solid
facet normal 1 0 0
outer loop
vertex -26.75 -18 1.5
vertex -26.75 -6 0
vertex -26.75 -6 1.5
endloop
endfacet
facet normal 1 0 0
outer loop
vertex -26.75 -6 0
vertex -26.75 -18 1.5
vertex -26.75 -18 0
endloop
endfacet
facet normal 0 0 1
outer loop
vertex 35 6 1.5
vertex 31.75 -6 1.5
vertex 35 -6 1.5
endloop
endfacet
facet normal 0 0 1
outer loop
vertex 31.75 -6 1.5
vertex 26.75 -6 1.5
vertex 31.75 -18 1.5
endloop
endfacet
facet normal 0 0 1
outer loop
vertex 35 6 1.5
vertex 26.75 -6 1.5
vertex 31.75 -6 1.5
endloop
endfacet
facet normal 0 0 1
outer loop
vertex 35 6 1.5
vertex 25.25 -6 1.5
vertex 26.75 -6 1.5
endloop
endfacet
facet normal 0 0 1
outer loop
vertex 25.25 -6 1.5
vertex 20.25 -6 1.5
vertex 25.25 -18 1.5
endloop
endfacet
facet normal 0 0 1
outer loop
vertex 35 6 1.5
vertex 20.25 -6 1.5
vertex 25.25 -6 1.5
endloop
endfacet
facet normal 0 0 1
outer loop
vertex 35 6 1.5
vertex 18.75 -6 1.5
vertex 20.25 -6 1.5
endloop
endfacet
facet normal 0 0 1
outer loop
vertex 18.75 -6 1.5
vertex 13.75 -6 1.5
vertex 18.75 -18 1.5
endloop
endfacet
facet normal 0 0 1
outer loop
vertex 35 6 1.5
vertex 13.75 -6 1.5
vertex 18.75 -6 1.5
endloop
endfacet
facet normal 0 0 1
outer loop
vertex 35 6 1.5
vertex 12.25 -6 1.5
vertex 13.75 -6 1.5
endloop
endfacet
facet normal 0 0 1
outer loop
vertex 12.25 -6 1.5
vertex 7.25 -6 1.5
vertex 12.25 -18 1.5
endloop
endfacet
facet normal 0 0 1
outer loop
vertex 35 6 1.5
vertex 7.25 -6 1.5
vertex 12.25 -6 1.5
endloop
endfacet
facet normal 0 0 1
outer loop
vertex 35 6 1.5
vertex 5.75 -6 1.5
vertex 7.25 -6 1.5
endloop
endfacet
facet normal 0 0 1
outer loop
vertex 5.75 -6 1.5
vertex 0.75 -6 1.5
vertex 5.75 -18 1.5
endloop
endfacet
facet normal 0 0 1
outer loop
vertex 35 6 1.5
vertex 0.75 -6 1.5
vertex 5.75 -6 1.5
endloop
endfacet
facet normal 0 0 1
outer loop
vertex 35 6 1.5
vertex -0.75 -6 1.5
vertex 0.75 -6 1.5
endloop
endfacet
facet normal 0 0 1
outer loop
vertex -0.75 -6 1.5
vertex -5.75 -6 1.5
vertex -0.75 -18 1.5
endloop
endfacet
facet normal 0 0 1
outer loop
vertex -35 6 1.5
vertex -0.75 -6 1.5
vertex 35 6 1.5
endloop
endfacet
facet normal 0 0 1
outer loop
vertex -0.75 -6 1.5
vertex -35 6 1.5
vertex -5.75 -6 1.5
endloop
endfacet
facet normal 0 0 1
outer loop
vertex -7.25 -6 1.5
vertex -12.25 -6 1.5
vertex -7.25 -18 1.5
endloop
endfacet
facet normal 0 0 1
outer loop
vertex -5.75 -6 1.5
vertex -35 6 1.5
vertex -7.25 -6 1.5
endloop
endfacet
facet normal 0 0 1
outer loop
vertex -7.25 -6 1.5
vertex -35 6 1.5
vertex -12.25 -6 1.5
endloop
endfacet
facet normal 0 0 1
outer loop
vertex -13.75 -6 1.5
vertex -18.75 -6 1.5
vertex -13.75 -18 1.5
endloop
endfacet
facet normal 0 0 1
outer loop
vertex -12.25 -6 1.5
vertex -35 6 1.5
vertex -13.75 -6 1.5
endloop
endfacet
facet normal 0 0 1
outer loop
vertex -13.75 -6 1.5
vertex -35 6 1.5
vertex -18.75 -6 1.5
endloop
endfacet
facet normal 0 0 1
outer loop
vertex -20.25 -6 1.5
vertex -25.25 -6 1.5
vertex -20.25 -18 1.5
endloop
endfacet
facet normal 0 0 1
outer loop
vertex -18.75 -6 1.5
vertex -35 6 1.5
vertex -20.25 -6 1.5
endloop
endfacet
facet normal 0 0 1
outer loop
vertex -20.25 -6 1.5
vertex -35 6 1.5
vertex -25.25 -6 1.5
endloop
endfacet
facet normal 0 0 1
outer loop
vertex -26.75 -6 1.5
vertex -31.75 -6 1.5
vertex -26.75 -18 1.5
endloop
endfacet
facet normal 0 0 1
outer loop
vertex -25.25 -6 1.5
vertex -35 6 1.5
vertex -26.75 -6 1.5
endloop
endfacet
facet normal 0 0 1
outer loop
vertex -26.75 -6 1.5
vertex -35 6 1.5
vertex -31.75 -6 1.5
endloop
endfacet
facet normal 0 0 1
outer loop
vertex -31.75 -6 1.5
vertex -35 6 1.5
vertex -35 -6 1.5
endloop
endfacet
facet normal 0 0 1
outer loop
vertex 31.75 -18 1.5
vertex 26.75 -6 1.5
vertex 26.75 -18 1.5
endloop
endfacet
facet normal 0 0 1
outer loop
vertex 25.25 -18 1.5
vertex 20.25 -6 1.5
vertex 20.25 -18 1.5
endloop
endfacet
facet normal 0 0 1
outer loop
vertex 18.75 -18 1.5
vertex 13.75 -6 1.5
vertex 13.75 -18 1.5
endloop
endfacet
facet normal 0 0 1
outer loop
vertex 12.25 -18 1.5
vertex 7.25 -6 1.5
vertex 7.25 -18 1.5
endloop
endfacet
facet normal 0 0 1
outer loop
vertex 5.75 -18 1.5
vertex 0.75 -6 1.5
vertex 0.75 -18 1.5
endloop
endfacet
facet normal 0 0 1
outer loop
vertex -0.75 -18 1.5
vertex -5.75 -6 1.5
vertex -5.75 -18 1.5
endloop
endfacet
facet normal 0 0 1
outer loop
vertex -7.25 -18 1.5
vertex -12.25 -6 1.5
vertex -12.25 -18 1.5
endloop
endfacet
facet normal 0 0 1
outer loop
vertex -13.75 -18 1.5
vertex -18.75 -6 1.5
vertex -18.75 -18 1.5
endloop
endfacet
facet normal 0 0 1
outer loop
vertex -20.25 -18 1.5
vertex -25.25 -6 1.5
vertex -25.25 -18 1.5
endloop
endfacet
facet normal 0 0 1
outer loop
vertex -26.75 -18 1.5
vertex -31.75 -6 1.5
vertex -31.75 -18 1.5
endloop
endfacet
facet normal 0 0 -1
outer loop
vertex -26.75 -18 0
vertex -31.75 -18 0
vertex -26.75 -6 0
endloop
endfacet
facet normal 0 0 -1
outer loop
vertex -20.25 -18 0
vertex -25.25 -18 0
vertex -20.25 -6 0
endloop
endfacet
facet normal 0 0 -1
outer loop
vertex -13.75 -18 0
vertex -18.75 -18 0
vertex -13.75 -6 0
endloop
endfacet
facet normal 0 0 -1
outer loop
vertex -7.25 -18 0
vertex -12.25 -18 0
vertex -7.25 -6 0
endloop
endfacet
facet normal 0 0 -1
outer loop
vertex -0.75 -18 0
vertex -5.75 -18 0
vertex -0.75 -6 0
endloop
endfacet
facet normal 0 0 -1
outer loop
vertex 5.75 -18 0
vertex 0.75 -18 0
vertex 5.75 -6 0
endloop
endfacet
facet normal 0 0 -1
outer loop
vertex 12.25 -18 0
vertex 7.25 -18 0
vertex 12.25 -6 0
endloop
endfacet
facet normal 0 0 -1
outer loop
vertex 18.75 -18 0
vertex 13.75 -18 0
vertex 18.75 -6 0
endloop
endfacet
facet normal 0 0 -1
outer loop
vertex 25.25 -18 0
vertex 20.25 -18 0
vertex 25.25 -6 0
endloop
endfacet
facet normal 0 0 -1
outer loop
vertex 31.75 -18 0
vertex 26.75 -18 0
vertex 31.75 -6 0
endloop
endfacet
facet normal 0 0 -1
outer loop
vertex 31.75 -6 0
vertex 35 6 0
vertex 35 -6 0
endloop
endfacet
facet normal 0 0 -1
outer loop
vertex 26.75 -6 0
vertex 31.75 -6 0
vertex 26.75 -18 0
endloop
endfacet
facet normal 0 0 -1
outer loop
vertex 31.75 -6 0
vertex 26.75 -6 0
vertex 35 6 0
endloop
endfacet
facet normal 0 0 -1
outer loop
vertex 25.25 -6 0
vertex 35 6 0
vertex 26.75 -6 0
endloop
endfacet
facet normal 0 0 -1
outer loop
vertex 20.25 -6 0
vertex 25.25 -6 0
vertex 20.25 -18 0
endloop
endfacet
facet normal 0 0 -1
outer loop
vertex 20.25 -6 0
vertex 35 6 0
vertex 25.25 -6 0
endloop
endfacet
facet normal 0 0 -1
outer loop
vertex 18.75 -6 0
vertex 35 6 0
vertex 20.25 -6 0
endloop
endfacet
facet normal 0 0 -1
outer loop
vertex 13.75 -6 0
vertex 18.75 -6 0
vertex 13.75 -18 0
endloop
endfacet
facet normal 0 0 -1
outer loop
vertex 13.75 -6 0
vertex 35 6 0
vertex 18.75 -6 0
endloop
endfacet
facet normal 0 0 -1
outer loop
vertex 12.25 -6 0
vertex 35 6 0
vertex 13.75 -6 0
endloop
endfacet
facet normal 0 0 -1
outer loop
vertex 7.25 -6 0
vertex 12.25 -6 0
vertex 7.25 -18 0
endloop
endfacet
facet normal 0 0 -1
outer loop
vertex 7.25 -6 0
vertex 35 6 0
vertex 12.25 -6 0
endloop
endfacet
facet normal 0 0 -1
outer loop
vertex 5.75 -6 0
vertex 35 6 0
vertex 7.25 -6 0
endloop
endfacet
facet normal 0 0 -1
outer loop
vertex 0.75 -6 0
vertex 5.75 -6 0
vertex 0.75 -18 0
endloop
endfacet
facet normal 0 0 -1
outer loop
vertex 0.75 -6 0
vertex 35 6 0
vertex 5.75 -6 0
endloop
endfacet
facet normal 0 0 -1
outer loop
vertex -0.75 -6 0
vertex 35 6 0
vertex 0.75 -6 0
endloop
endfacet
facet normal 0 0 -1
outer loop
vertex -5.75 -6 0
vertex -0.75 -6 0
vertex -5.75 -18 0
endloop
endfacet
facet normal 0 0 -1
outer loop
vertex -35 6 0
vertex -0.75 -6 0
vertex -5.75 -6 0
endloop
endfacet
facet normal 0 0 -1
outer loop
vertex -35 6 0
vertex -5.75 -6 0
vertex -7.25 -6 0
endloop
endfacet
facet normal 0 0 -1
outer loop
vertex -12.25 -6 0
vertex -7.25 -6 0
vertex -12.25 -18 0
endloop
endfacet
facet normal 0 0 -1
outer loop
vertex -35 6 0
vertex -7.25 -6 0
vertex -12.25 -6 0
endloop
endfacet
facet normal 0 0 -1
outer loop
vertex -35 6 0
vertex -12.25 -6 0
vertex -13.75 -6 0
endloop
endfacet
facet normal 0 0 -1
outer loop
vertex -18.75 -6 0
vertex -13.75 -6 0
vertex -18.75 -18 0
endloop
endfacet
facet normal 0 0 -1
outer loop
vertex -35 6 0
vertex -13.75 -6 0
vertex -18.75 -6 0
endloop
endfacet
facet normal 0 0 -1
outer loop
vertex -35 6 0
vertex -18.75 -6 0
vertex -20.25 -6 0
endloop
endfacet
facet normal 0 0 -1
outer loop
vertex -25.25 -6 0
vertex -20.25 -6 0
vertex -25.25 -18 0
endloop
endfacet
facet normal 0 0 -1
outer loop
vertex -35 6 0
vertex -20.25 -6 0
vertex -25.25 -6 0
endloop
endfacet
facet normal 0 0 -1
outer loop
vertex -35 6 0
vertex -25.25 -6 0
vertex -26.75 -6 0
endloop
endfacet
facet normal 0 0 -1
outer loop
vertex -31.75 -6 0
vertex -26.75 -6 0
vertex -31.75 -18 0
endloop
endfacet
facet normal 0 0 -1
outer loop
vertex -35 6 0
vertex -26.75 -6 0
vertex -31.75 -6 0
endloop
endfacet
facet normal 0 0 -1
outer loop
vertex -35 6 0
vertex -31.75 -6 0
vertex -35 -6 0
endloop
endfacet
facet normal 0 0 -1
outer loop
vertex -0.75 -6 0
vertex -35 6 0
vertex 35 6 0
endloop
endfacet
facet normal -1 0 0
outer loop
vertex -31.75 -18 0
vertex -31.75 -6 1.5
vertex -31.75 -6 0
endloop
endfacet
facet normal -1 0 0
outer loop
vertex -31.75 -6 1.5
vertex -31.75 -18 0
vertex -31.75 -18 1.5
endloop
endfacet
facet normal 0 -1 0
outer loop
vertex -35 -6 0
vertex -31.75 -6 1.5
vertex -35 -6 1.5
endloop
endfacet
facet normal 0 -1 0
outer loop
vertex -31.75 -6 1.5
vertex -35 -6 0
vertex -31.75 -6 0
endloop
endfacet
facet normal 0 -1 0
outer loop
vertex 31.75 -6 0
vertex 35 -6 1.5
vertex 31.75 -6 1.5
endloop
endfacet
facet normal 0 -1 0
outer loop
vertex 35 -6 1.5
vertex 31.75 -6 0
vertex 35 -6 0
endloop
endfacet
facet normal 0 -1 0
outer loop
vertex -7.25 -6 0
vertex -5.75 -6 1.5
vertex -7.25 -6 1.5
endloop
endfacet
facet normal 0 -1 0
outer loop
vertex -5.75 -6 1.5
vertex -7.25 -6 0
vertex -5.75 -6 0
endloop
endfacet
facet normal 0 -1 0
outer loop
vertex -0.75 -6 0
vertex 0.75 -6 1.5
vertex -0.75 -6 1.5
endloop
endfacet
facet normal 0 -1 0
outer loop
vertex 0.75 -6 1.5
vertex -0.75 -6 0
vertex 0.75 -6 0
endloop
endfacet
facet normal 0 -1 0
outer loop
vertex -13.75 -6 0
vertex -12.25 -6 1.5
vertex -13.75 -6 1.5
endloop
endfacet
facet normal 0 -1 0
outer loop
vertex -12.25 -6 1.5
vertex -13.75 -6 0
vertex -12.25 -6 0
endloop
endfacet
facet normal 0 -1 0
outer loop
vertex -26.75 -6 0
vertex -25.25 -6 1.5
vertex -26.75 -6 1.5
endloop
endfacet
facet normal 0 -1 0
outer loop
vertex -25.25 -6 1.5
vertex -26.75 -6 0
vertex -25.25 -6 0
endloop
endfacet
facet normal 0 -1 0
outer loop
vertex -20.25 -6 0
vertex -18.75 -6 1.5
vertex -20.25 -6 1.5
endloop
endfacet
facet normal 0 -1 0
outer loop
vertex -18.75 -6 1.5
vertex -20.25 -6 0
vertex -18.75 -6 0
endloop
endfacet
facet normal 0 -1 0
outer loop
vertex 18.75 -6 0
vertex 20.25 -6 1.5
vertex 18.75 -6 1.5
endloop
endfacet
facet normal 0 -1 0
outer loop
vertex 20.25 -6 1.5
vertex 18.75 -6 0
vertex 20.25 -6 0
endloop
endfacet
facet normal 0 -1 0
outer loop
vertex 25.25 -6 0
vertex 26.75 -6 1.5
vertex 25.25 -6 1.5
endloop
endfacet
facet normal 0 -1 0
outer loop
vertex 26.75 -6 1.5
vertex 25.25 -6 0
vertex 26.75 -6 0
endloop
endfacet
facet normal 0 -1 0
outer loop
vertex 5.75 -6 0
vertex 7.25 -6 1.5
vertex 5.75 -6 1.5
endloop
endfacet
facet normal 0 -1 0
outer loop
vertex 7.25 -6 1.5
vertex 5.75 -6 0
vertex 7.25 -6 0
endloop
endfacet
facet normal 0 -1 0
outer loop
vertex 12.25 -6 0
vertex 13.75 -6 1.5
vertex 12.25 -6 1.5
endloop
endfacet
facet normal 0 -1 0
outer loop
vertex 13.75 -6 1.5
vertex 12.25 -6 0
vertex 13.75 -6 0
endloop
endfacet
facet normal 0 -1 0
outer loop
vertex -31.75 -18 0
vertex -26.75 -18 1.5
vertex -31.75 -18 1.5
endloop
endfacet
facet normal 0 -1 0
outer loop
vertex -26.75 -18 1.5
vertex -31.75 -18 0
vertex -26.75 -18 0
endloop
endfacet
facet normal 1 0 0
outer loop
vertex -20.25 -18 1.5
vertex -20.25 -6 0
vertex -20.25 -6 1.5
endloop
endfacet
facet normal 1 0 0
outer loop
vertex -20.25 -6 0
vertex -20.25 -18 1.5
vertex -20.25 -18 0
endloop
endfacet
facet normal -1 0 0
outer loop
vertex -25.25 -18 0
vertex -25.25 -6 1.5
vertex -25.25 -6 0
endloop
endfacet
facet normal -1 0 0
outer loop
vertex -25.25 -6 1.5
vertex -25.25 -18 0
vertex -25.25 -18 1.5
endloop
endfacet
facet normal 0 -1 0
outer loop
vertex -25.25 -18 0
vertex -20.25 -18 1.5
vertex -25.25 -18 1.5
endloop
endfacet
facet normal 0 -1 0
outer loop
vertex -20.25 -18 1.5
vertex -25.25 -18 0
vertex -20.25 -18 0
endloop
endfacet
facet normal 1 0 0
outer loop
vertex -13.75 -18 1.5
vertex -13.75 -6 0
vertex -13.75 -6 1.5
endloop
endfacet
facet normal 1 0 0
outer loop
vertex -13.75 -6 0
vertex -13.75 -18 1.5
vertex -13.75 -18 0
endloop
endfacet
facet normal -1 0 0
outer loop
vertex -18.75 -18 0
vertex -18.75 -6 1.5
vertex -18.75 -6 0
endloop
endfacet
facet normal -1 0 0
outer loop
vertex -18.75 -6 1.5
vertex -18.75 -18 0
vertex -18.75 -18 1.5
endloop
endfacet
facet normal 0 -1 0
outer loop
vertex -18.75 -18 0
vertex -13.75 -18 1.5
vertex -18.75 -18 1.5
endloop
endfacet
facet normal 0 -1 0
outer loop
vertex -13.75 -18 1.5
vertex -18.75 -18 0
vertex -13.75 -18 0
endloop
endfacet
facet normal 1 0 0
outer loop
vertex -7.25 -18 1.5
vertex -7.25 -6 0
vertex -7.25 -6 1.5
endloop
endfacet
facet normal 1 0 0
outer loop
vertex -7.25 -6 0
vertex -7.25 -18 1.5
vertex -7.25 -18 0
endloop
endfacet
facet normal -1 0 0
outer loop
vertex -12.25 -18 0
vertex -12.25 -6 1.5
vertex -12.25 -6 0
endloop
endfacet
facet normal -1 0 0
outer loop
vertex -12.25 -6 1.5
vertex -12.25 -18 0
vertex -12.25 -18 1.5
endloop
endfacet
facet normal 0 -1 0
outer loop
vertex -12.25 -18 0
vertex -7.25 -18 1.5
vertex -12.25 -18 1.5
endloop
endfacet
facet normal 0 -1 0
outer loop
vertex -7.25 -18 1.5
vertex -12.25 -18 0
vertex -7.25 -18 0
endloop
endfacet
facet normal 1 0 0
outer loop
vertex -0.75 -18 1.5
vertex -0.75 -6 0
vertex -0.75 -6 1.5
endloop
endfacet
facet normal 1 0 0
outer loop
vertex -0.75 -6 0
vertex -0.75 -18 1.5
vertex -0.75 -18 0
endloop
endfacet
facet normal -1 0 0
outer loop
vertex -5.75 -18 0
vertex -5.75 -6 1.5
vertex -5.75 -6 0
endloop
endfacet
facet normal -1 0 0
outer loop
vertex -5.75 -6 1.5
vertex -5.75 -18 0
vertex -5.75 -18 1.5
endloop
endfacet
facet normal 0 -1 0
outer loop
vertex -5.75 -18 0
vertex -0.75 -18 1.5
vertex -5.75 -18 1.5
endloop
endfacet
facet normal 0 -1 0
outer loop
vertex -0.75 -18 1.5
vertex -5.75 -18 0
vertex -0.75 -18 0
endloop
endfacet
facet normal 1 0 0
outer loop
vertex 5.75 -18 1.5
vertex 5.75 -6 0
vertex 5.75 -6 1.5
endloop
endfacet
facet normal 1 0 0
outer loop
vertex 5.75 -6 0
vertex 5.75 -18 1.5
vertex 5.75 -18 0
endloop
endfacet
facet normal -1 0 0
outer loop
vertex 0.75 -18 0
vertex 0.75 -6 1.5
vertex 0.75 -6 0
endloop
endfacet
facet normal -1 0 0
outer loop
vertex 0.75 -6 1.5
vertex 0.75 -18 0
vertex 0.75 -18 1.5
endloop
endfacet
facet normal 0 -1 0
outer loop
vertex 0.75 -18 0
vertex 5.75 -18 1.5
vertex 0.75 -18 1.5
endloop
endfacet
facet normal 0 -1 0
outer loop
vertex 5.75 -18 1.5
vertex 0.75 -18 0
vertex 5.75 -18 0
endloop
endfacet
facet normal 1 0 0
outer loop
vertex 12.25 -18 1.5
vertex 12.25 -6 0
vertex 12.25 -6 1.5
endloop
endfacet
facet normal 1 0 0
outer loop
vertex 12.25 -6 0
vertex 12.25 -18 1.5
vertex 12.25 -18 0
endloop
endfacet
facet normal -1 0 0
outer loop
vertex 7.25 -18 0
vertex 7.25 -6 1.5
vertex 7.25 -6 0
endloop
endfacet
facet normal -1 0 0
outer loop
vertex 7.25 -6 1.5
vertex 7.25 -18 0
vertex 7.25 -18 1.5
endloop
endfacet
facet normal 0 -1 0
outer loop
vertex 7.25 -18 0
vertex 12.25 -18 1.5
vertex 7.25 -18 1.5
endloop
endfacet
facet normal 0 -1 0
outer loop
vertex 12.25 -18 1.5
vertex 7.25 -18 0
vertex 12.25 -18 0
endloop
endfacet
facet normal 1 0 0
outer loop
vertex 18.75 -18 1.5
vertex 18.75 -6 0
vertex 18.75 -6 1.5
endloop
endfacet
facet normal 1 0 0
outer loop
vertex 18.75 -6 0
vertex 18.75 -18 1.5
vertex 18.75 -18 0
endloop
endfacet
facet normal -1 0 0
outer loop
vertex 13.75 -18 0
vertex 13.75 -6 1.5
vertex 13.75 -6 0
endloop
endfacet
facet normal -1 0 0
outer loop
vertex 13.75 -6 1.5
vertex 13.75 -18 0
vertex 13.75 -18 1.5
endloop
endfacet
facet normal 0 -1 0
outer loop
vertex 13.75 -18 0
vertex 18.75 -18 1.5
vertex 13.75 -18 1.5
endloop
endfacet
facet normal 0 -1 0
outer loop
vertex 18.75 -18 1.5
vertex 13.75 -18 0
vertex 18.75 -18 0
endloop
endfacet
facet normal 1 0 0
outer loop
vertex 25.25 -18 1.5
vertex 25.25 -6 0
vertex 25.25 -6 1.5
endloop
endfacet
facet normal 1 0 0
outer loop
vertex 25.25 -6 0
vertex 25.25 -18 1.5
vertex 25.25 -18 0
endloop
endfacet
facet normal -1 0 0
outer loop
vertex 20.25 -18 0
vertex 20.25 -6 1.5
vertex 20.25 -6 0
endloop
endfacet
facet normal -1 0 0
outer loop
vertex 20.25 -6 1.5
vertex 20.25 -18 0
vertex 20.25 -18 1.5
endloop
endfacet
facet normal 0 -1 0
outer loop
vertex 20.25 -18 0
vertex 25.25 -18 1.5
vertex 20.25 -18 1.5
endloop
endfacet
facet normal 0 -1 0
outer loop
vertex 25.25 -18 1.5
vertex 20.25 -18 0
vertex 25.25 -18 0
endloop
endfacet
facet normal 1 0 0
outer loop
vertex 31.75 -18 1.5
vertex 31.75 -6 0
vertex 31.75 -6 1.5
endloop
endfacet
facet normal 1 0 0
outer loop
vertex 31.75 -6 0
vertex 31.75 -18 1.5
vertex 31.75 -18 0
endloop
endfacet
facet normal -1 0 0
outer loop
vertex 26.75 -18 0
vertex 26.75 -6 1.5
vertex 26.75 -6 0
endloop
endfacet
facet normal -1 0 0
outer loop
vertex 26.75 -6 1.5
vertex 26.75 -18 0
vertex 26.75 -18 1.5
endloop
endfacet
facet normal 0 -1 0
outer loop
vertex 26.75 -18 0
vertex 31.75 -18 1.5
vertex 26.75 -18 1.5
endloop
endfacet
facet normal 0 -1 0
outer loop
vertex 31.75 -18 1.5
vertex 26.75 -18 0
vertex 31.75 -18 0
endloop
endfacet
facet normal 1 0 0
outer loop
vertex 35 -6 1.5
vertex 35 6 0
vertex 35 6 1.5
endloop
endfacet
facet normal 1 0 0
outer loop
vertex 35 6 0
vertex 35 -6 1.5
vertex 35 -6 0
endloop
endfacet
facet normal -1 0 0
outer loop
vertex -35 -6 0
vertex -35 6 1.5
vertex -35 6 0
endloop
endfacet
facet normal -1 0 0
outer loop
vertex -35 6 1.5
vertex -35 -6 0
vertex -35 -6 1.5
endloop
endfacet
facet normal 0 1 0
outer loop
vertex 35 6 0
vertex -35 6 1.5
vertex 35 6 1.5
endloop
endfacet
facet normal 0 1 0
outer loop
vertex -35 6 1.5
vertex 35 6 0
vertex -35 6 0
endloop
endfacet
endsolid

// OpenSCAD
// Agarose gel comb for 10-lane gel electrophoresis
// Printed lying flat on XY plane, builds upward in Z

// Dimensions (mm)
spine_length_x = 70;      // Length of spine/backbone in X
spine_width_y = 12;       // Width of spine/backbone in Y
thickness_z = 1.5;        // Thickness of entire comb in Z

tooth_width_x = 5.0;      // Width of each tooth in X
tooth_length_y = 12;      // Length of each tooth in Y (protrusion)
tooth_gap = 1.5;          // Gap between adjacent teeth
num_teeth = 10;           // Number of teeth

$fn = 64;

// Calculate total span of teeth
teeth_total_span = num_teeth * tooth_width_x + (num_teeth - 1) * tooth_gap;

// Offsets to center comb at origin in XY
spine_x_min = -spine_length_x / 2;
spine_y_min = -spine_width_y / 2;

// Main spine/backbone
translate([spine_x_min, spine_y_min, 0]) {
    cube([spine_length_x, spine_width_y, thickness_z]);
}

// Ten teeth protruding in -Y direction
// Teeth are centered on spine in X
teeth_start_x = spine_x_min + (spine_length_x - teeth_total_span) / 2;

for (i = [0:num_teeth-1]) {
    tooth_x = teeth_start_x + i * (tooth_width_x + tooth_gap);
    tooth_y = spine_y_min - tooth_length_y;
    translate([tooth_x, tooth_y, 0]) {
        cube([tooth_width_x, tooth_length_y, thickness_z]);
    }
}
